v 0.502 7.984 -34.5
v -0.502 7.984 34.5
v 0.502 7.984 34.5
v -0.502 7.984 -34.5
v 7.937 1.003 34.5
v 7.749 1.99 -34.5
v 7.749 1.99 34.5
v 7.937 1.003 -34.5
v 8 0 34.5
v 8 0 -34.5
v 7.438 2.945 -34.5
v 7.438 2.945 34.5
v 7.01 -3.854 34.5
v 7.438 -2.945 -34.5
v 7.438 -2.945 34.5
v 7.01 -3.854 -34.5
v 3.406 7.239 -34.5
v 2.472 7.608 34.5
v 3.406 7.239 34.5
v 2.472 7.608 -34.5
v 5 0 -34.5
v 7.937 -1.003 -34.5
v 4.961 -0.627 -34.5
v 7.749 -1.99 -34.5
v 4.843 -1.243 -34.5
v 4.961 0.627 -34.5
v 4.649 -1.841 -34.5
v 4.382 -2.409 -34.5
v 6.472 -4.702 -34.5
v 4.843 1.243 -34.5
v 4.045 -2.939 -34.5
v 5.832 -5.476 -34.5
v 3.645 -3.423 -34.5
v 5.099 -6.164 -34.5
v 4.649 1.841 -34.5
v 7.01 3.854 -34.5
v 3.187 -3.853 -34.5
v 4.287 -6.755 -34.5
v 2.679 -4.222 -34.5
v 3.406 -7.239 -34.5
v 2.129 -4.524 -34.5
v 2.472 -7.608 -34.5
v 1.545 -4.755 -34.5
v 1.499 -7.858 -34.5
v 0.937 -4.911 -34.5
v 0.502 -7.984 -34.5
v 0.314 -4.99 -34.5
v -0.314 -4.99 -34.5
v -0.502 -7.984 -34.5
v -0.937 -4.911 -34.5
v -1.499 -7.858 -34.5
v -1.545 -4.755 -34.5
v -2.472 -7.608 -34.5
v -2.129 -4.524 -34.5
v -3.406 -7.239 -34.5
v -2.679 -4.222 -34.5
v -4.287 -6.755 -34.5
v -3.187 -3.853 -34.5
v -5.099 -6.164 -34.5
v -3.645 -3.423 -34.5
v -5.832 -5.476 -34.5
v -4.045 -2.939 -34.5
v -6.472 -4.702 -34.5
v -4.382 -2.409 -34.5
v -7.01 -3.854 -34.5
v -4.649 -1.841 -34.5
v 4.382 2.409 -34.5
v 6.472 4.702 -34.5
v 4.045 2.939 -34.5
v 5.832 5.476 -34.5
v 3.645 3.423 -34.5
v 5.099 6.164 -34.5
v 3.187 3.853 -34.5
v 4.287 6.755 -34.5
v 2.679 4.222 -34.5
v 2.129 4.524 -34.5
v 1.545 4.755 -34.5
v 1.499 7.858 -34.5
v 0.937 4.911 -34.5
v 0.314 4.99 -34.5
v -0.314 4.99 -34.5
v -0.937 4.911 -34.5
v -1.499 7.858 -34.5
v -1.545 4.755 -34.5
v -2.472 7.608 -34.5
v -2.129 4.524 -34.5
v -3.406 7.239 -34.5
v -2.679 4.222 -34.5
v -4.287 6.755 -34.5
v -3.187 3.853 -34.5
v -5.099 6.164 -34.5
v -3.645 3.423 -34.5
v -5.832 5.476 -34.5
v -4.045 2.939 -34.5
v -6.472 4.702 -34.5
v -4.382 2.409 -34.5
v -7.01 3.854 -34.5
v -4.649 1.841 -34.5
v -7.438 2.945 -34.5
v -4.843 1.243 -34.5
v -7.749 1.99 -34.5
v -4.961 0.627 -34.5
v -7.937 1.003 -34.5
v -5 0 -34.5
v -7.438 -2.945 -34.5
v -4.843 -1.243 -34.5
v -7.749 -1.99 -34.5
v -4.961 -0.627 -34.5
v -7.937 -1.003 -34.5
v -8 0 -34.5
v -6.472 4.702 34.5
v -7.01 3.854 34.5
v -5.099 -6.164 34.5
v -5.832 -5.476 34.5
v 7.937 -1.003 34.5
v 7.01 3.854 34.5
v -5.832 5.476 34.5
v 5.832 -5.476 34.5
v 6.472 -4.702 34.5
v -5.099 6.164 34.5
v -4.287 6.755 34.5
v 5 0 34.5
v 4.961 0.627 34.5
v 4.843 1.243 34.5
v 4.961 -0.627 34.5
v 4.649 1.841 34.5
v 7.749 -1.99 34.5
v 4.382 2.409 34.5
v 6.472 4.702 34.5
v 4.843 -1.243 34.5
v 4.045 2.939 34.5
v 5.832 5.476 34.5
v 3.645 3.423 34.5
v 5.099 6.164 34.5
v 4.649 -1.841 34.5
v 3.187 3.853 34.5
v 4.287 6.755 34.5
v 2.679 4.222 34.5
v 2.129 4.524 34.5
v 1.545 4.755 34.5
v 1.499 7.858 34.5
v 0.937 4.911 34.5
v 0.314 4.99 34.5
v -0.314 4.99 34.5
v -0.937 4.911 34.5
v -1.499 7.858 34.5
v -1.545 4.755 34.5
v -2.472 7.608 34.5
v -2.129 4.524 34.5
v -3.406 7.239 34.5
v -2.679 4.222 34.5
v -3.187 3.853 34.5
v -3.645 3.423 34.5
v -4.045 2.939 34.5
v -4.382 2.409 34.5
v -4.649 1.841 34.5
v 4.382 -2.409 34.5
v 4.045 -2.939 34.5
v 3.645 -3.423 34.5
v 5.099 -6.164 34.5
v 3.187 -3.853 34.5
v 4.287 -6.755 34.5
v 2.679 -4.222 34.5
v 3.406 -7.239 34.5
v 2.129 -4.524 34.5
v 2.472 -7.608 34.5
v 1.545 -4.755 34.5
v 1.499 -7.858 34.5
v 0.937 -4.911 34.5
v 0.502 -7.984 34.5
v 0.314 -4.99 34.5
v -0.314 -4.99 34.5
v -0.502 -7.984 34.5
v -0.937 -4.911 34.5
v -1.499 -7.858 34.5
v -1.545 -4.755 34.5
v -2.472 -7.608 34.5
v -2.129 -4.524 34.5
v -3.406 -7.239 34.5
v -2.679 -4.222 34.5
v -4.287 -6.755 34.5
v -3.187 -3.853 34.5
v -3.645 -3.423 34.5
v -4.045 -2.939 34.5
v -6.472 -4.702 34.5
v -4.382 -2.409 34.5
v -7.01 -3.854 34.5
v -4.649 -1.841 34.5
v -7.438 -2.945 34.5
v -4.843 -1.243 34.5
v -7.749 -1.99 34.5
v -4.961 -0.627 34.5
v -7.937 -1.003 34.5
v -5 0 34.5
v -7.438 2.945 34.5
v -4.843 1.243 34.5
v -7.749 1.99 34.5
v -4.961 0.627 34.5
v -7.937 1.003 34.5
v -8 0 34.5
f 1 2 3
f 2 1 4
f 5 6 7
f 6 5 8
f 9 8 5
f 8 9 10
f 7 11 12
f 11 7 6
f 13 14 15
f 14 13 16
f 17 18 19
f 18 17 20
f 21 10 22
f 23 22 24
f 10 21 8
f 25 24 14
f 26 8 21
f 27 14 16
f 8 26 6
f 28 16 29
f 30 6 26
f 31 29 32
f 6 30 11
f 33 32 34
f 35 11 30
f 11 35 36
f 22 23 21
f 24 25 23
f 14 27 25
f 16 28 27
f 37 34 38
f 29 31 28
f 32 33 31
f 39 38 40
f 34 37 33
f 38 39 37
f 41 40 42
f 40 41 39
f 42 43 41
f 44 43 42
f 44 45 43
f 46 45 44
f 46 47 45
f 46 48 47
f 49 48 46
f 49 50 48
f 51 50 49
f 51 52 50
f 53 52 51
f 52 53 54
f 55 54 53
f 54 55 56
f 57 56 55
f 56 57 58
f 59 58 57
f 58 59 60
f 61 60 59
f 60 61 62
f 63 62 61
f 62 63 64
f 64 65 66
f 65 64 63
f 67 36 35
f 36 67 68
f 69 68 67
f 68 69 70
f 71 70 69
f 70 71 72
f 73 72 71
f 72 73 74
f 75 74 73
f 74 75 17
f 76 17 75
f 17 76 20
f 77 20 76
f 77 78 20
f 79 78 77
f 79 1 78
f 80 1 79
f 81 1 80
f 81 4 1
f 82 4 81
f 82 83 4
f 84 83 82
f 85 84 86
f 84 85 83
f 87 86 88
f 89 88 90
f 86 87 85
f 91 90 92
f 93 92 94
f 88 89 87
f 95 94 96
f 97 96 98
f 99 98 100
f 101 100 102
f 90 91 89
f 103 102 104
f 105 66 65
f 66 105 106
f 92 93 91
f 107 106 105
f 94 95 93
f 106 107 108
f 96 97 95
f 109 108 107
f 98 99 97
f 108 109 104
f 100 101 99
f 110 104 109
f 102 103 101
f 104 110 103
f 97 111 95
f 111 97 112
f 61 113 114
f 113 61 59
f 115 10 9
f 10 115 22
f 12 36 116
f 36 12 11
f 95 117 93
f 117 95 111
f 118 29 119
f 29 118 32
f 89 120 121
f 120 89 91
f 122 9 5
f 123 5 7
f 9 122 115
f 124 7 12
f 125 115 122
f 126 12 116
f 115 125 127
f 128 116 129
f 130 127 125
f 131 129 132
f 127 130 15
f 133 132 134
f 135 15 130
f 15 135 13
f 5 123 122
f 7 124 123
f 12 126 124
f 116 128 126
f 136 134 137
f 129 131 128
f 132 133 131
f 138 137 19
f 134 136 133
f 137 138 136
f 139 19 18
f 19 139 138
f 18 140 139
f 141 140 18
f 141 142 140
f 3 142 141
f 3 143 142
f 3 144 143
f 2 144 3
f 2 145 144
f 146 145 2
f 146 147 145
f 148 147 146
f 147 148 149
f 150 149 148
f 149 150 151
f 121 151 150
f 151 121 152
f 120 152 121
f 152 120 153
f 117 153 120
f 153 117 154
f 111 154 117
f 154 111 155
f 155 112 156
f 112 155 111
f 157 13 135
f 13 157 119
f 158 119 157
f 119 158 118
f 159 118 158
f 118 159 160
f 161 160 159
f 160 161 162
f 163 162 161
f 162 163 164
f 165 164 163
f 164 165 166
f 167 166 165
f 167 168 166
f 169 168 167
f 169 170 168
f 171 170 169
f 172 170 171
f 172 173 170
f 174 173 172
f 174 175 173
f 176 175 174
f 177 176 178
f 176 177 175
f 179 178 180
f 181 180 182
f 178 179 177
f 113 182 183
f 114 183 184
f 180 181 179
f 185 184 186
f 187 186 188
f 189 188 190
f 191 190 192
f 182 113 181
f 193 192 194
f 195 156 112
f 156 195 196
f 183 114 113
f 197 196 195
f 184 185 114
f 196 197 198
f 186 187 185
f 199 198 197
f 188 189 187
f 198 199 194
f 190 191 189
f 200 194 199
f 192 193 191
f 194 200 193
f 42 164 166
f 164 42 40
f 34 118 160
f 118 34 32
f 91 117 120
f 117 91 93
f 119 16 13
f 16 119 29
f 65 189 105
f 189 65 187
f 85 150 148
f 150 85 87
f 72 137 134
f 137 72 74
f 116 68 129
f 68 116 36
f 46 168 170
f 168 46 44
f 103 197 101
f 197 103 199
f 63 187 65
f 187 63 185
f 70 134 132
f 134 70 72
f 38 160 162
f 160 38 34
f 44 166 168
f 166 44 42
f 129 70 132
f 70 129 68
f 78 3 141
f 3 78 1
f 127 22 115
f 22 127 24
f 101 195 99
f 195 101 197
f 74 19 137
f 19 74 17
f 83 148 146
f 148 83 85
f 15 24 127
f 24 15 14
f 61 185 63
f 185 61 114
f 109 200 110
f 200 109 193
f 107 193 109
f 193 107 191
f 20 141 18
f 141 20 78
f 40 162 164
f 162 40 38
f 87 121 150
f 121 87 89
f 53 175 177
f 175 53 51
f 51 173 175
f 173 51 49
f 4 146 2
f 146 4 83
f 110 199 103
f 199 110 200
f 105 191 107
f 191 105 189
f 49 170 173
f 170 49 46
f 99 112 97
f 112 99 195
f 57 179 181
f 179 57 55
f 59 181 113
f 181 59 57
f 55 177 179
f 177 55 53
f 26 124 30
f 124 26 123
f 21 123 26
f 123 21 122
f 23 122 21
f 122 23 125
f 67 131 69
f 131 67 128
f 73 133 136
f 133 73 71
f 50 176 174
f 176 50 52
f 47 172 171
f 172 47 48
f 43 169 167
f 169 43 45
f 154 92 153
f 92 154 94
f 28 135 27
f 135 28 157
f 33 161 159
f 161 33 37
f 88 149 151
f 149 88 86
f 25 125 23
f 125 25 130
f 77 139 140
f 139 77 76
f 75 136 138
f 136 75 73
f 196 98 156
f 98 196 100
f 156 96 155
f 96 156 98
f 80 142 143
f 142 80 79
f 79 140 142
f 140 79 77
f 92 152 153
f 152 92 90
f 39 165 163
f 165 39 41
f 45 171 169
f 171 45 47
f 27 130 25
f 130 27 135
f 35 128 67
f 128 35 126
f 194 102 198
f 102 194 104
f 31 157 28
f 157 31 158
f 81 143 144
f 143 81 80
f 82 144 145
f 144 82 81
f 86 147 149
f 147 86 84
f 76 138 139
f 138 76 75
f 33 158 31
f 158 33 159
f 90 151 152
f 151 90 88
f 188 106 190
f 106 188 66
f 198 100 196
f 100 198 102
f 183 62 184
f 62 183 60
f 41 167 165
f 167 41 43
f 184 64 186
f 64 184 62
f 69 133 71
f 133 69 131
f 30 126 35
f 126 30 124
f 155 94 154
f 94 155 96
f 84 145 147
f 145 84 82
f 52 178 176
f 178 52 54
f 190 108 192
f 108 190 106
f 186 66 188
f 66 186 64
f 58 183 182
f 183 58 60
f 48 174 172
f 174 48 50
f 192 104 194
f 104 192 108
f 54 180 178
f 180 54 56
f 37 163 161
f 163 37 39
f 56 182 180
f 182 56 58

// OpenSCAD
$fn = 50;


difference() {
	union() {
		translate(v = [0, 0, -34.5000000000]) {
			cylinder(h = 69, r = 8.0000000000);
		}
	}
	union() {
		translate(v = [0, 0, -100.0000000000]) {
			cylinder(h = 200, r = 5.0000000000);
		}
	}
}
